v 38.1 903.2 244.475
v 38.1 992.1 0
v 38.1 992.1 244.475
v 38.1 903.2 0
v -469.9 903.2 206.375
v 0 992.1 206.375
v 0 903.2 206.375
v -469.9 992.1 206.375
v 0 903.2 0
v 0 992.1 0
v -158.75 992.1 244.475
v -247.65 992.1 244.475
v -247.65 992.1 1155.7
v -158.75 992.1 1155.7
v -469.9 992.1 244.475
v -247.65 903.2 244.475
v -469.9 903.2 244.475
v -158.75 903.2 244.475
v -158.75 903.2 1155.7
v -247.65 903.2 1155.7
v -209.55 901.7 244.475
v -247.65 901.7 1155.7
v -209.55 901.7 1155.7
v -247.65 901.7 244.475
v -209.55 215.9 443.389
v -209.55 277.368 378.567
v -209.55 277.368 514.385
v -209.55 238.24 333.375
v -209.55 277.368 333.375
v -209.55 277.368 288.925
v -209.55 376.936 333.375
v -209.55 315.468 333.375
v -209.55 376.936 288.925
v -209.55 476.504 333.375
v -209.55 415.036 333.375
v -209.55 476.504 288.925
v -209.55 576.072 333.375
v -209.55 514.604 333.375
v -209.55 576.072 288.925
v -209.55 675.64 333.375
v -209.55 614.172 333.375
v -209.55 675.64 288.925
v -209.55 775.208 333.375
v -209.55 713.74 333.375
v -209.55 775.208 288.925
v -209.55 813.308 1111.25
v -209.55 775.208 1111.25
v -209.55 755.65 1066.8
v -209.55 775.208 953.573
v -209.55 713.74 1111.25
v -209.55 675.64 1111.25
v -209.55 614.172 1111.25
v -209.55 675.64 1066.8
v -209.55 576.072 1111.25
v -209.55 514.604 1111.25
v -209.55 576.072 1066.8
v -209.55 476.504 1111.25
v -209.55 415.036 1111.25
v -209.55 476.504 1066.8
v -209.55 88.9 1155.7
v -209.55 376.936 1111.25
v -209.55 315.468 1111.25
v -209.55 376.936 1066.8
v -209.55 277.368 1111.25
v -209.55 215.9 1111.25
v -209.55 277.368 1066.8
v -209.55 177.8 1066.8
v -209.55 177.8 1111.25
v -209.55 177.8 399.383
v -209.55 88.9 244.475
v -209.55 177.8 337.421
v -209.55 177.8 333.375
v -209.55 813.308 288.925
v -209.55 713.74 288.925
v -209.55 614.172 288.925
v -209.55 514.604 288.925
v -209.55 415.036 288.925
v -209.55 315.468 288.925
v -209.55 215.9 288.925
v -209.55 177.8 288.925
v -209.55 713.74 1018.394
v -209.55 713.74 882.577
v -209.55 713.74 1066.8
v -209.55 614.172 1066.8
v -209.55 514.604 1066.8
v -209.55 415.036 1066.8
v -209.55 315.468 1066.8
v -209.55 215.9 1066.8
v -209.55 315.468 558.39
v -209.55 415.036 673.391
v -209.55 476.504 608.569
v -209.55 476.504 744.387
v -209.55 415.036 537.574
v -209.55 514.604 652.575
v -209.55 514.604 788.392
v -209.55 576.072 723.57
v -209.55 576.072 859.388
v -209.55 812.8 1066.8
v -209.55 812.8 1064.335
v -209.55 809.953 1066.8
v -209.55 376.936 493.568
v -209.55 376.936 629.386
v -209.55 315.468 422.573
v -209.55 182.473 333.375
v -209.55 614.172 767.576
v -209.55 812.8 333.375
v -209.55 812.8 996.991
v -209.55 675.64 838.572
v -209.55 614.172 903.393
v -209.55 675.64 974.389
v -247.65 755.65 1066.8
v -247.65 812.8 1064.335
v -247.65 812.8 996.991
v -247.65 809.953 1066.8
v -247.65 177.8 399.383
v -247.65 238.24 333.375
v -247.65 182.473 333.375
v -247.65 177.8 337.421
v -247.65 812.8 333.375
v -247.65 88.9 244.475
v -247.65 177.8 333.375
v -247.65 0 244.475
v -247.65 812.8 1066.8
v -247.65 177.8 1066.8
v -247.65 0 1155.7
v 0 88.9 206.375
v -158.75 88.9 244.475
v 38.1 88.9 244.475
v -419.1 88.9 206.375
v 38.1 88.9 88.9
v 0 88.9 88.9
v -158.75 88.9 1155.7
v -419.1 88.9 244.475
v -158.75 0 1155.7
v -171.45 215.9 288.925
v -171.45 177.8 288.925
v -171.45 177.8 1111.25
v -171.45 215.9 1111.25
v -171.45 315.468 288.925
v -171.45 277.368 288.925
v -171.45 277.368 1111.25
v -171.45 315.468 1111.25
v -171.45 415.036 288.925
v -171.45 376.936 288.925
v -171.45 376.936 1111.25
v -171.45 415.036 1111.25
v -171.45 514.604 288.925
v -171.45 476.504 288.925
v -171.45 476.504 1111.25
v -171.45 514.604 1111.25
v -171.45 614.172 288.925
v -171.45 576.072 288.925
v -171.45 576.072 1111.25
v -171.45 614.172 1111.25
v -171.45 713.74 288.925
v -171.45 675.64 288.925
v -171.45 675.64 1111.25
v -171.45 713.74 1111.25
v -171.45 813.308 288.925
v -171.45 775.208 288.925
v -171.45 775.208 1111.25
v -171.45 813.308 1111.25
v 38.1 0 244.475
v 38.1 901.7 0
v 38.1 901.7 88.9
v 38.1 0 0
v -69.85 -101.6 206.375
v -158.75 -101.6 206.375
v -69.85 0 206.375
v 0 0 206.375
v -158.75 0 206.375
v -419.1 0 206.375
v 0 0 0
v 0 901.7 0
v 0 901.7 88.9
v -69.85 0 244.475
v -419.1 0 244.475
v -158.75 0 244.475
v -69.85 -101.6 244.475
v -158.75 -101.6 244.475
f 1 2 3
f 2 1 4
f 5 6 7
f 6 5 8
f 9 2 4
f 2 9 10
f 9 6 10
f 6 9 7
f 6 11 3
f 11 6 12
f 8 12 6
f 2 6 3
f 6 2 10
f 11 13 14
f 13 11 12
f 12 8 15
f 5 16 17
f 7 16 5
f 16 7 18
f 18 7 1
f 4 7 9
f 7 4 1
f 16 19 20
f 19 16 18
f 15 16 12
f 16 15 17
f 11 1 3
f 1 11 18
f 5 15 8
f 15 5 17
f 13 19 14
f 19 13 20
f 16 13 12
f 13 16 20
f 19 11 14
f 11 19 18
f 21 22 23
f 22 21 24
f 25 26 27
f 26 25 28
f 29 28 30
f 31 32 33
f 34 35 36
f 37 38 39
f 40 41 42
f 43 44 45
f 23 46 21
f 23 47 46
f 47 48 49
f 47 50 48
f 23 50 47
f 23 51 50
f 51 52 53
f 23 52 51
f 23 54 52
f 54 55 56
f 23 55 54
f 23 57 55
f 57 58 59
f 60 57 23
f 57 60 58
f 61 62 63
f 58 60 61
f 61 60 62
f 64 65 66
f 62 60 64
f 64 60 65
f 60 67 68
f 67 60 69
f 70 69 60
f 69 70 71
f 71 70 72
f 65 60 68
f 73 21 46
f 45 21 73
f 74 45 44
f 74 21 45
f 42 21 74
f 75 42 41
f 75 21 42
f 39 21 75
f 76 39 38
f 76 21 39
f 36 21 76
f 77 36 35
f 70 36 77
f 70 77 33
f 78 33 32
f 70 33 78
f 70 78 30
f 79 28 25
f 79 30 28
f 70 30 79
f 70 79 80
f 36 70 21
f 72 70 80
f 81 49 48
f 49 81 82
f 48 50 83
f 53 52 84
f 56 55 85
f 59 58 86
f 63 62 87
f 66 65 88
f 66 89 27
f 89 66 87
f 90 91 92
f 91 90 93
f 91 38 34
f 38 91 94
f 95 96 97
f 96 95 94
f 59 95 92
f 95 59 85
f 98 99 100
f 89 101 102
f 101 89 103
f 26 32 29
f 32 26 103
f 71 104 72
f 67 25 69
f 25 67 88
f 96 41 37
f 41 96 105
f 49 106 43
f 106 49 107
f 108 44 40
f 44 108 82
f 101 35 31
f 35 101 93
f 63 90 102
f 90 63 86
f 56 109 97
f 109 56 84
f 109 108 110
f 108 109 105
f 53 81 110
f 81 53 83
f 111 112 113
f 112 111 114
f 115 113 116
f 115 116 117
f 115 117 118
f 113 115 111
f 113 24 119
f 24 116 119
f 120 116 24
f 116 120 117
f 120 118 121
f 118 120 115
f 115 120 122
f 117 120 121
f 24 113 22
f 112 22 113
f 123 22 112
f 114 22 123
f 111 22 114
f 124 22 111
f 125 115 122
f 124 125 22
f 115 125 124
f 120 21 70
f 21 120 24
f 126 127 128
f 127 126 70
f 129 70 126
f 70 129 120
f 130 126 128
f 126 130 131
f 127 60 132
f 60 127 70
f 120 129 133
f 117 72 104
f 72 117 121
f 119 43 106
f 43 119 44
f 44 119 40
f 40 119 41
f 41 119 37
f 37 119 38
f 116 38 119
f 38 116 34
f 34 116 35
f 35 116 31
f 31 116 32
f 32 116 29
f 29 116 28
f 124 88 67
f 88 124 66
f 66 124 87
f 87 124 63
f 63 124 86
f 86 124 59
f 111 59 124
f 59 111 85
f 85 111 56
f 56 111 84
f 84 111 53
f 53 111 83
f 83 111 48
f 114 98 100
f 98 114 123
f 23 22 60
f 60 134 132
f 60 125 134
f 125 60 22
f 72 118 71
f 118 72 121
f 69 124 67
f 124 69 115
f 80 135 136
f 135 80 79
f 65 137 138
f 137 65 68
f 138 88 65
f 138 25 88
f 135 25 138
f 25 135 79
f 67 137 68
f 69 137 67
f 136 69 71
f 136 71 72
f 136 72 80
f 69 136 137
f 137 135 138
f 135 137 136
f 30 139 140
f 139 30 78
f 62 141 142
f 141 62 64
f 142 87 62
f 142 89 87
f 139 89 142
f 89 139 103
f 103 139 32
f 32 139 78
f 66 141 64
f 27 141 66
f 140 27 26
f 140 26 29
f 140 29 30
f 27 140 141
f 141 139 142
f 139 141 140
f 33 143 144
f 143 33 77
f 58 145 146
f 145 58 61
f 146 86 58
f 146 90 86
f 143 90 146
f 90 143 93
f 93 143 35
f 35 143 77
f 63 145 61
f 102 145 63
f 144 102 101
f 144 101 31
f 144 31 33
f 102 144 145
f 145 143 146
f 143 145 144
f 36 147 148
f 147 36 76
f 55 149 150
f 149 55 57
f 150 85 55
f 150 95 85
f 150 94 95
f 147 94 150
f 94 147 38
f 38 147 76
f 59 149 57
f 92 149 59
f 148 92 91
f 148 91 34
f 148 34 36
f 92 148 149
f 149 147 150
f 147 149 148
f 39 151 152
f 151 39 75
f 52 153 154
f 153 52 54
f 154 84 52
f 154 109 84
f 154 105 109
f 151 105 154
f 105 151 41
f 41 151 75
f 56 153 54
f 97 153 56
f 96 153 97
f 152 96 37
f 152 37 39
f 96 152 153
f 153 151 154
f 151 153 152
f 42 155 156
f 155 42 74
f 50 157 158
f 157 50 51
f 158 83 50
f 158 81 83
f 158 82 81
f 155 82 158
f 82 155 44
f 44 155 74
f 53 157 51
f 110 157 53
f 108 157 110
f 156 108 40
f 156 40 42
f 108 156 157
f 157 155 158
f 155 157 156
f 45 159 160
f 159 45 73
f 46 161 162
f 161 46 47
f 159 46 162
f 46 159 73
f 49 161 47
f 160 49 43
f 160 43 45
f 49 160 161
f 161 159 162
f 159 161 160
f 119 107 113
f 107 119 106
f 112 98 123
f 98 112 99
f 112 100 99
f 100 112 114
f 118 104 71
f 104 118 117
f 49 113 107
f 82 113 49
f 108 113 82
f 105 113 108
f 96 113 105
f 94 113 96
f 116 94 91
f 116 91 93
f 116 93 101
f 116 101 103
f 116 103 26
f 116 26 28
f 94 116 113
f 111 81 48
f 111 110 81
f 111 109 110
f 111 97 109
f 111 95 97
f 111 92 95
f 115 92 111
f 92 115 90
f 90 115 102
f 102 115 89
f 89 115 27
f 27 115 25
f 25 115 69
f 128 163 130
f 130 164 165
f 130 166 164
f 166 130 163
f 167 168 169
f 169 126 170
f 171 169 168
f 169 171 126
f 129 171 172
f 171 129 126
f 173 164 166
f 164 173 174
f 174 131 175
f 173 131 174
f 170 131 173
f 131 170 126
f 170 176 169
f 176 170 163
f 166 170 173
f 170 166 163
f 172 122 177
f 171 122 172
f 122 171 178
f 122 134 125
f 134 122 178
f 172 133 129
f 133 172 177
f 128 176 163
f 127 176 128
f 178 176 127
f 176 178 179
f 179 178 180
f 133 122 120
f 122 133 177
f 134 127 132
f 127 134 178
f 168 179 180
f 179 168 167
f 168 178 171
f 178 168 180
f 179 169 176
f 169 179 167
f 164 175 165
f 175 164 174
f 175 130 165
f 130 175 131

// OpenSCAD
// ===============================================
// baby gate
// ===============================================
// This is a simplistic design for an attempt at a
// free standing, non-pressure fit baby gate to
// sit at the top of a set of stairs.
// ===============================================

// ===============================================
// Unit Conversion Factors
// ===============================================

mm_per_inch = 25.4;
one_by_one_dim = 0.75;
two_by_two_dim = 1.5;
two_by_four_x = 1.5;
two_by_four_y = 3.5;
four_by_four_x = 3.5;
four_by_four_y = 3.5;

// ===============================================
// Major Dimensions
// ===============================================

bottom_stair_support_length = 8.125;
bottom_support_length_latch_side = 20;
bottom_support_length_hinge_side = 18;
vertical_gate_support_height = 35.875;
gate_width = 32;
//stair_to_post_offset = 7;
stair_to_post_offset = 5.5;
stair_overhang = 0.75;
post_to_gate_bar_offset = 2;

// ===============================================
// Dimensional Lumber Definitions
// ===============================================

module one_by_one(len_in) {
	color("#5d4037")
    cube([
        one_by_one_dim * mm_per_inch,
        one_by_one_dim * mm_per_inch,
        len_in * mm_per_inch
    ]);
}

module two_by_two(len_in) {
	color("#5d4037")
    cube([
        two_by_two_dim * mm_per_inch,
        two_by_two_dim * mm_per_inch,
        len_in * mm_per_inch
    ]);
}

module two_by_four(len_in) {
	color("#5d4037")
    cube([
        two_by_four_x * mm_per_inch, 
        two_by_four_y * mm_per_inch, 
        len_in * mm_per_inch
    ]);
}

module four_by_four(len_in) {
	color("#5d4037")
    cube([
        four_by_four_x * mm_per_inch, 
        four_by_four_y * mm_per_inch, 
        len_in * mm_per_inch
    ]);
}

// ===============================================
// Model Definitions
// ===============================================

module hinge_side_gate_support() {
	// Stair Support
	two_by_four(bottom_stair_support_length);

	// Support Base
	translate([
		two_by_four_x * mm_per_inch, 
		0, 
		bottom_stair_support_length*mm_per_inch
	])
		rotate([0, -90, 0])
		two_by_four(bottom_support_length_hinge_side);

	// Gate Support Post
	translate([
		- (stair_to_post_offset + stair_overhang) * mm_per_inch,
		0,
		(bottom_stair_support_length + two_by_four_x) * mm_per_inch
	])
		rotate([0, 0, 90])
		four_by_four(vertical_gate_support_height);
	
	// Banister Wrap Fall Guard
	translate([
		- (stair_to_post_offset + stair_overhang) * mm_per_inch,
		0,
		(bottom_stair_support_length + two_by_four_x) * mm_per_inch
	])
		rotate([90, 90, 0])
		two_by_four(4);
	
	// Stair Support Connector
	translate([
		0,
		two_by_four_y * mm_per_inch,
		two_by_four_y * mm_per_inch
	])
		rotate([-90, 0, 0])
		two_by_four(gate_width);
}

module gate_door() {
	// Gate Bottom
	translate([
		- (stair_to_post_offset + stair_overhang + four_by_four_x) * mm_per_inch,
		two_by_four_y * mm_per_inch,
		(bottom_stair_support_length + four_by_four_x + two_by_four_x) * mm_per_inch
	])
		rotate([-90, 0, 0])
		two_by_four(gate_width);

	// Gate Top
	translate([
		- (stair_to_post_offset + stair_overhang + four_by_four_x) * mm_per_inch,
		two_by_four_y * mm_per_inch,
		(bottom_stair_support_length + four_by_four_x + two_by_four_x + vertical_gate_support_height - two_by_four_y) * mm_per_inch
	])
		rotate([-90, 0, 0])
		two_by_four(gate_width);

	// Gate Hinge Side
	translate([
		- (stair_to_post_offset + stair_overhang + four_by_four_x) * mm_per_inch,
		(four_by_four_y + four_by_four_x) * mm_per_inch,
		(bottom_stair_support_length + two_by_four_x + vertical_gate_support_height - four_by_four_x) * mm_per_inch
	])
		rotate([-180, 0, 0])
		two_by_four((vertical_gate_support_height - two_by_four_y - two_by_four_y));

	// Gate Bar 1
	translate([
		- (stair_to_post_offset + stair_overhang + post_to_gate_bar_offset) * mm_per_inch,
		(four_by_four_y + two_by_four_y + two_by_two_dim) * mm_per_inch,
		(bottom_stair_support_length + two_by_four_x + vertical_gate_support_height - 1.75) * mm_per_inch
	])
		rotate([-180, 0, 0])
		two_by_two((vertical_gate_support_height - two_by_four_y));

	// Gate Bar 2
	translate([
		- (stair_to_post_offset + stair_overhang + post_to_gate_bar_offset) * mm_per_inch,
		(four_by_four_y + two_by_four_y + 2 * two_by_two_dim + 2.42) * mm_per_inch,
		(bottom_stair_support_length + two_by_four_x + vertical_gate_support_height - 1.75) * mm_per_inch
	])
		rotate([-180, 0, 0])
		two_by_two((vertical_gate_support_height - two_by_four_y));

	// Gate Bar 3
	translate([
		- (stair_to_post_offset + stair_overhang + post_to_gate_bar_offset) * mm_per_inch,
		(four_by_four_y + two_by_four_y + 3 * two_by_two_dim + 2 * 2.42) * mm_per_inch,
		(bottom_stair_support_length + two_by_four_x + vertical_gate_support_height - 1.75) * mm_per_inch
	])
		rotate([-180, 0, 0])
		two_by_two((vertical_gate_support_height - two_by_four_y));

	// Gate Bar 4
	translate([
		- (stair_to_post_offset + stair_overhang + post_to_gate_bar_offset) * mm_per_inch,
		(four_by_four_y + two_by_four_y + 4 * two_by_two_dim + 3 * 2.42) * mm_per_inch,
		(bottom_stair_support_length + two_by_four_x + vertical_gate_support_height - 1.75) * mm_per_inch
	])
		rotate([-180, 0, 0])
		two_by_two((vertical_gate_support_height - two_by_four_y));

	// Gate Bar 5
	translate([
		- (stair_to_post_offset + stair_overhang + post_to_gate_bar_offset) * mm_per_inch,
		(four_by_four_y + two_by_four_y + 5 * two_by_two_dim + 4 * 2.42) * mm_per_inch,
		(bottom_stair_support_length + two_by_four_x + vertical_gate_support_height - 1.75) * mm_per_inch
	])
		rotate([-180, 0, 0])
		two_by_two((vertical_gate_support_height - two_by_four_y));

	// Gate Bar 6
	translate([
		- (stair_to_post_offset + stair_overhang + post_to_gate_bar_offset) * mm_per_inch,
		(four_by_four_y + two_by_four_y + 6 * two_by_two_dim + 5 * 2.42) * mm_per_inch,
		(bottom_stair_support_length + two_by_four_x + vertical_gate_support_height - 1.75) * mm_per_inch
	])
		rotate([-180, 0, 0])
		two_by_two((vertical_gate_support_height - two_by_four_y));
	
	// Gate Bar 7
	translate([
		- (stair_to_post_offset + stair_overhang + post_to_gate_bar_offset) * mm_per_inch,
		(four_by_four_y + two_by_four_y + 7 * two_by_two_dim + 6 * 2.42) * mm_per_inch,
		(bottom_stair_support_length + two_by_four_x + vertical_gate_support_height - 1.75) * mm_per_inch
	])
		rotate([-180, 0, 0])
		two_by_two((vertical_gate_support_height - two_by_four_y));

	// Gate Latch Side
	translate([
		- (stair_to_post_offset + stair_overhang + four_by_four_x) * mm_per_inch,
		(gate_width + four_by_four_y) * mm_per_inch,
		(bottom_stair_support_length + two_by_four_x + vertical_gate_support_height - four_by_four_x) * mm_per_inch
	])
		rotate([-180, 0, 0])
		two_by_four((vertical_gate_support_height - two_by_four_y - two_by_four_y));

	// Gate Diagonal (Runs bottom of hinge side to top of latch side)
	// I think that the moral of the story here is
	// that there have been a lot of years since trig
	// and I were intimate and I'm a noobcake at OpenSCAD
	hypotenuse = round(sqrt(pow(vertical_gate_support_height - 2*two_by_four_y, 2) + pow(gate_width - 2*two_by_four_y, 2)));
	angle = atan2(vertical_gate_support_height - 2*two_by_four_y, gate_width - 2*two_by_four_y);
	other_angle = 90 - angle;
	rotate([-other_angle, 0, 0])
		translate([
			- (stair_to_post_offset + stair_overhang + four_by_four_x) * mm_per_inch,
			- (two_by_four_y + two_by_four_x) * mm_per_inch,
			(bottom_stair_support_length + two_by_four_x + two_by_four_y + two_by_four_x) * mm_per_inch
		])
		two_by_four(hypotenuse);
}

// ===============================================
// Latch Side Gate Support

module latch_side_gate_support() {
	// Stair Support
	translate([
		0,
		two_by_four_x + (gate_width + two_by_four_y) * mm_per_inch,
		0
	])
		two_by_four(bottom_stair_support_length);

	// Support Base
	translate([
		two_by_four_x * mm_per_inch, 
		two_by_four_x + (gate_width + two_by_four_y) *mm_per_inch, 
		bottom_stair_support_length*mm_per_inch
	])
		rotate([0, -90, 0])
		two_by_four(bottom_support_length_latch_side);

	// Gate Support Post
	translate([
		- (stair_to_post_offset + stair_overhang) * mm_per_inch,
		two_by_four_x + (gate_width + two_by_four_y) *mm_per_inch, 
		(bottom_stair_support_length + two_by_four_x) * mm_per_inch
	])
		rotate([0, 0, 90])
		four_by_four(vertical_gate_support_height);
}

// ===============================================
// Model Specification
// ===============================================

latch_side_gate_support();
gate_door();
hinge_side_gate_support();
